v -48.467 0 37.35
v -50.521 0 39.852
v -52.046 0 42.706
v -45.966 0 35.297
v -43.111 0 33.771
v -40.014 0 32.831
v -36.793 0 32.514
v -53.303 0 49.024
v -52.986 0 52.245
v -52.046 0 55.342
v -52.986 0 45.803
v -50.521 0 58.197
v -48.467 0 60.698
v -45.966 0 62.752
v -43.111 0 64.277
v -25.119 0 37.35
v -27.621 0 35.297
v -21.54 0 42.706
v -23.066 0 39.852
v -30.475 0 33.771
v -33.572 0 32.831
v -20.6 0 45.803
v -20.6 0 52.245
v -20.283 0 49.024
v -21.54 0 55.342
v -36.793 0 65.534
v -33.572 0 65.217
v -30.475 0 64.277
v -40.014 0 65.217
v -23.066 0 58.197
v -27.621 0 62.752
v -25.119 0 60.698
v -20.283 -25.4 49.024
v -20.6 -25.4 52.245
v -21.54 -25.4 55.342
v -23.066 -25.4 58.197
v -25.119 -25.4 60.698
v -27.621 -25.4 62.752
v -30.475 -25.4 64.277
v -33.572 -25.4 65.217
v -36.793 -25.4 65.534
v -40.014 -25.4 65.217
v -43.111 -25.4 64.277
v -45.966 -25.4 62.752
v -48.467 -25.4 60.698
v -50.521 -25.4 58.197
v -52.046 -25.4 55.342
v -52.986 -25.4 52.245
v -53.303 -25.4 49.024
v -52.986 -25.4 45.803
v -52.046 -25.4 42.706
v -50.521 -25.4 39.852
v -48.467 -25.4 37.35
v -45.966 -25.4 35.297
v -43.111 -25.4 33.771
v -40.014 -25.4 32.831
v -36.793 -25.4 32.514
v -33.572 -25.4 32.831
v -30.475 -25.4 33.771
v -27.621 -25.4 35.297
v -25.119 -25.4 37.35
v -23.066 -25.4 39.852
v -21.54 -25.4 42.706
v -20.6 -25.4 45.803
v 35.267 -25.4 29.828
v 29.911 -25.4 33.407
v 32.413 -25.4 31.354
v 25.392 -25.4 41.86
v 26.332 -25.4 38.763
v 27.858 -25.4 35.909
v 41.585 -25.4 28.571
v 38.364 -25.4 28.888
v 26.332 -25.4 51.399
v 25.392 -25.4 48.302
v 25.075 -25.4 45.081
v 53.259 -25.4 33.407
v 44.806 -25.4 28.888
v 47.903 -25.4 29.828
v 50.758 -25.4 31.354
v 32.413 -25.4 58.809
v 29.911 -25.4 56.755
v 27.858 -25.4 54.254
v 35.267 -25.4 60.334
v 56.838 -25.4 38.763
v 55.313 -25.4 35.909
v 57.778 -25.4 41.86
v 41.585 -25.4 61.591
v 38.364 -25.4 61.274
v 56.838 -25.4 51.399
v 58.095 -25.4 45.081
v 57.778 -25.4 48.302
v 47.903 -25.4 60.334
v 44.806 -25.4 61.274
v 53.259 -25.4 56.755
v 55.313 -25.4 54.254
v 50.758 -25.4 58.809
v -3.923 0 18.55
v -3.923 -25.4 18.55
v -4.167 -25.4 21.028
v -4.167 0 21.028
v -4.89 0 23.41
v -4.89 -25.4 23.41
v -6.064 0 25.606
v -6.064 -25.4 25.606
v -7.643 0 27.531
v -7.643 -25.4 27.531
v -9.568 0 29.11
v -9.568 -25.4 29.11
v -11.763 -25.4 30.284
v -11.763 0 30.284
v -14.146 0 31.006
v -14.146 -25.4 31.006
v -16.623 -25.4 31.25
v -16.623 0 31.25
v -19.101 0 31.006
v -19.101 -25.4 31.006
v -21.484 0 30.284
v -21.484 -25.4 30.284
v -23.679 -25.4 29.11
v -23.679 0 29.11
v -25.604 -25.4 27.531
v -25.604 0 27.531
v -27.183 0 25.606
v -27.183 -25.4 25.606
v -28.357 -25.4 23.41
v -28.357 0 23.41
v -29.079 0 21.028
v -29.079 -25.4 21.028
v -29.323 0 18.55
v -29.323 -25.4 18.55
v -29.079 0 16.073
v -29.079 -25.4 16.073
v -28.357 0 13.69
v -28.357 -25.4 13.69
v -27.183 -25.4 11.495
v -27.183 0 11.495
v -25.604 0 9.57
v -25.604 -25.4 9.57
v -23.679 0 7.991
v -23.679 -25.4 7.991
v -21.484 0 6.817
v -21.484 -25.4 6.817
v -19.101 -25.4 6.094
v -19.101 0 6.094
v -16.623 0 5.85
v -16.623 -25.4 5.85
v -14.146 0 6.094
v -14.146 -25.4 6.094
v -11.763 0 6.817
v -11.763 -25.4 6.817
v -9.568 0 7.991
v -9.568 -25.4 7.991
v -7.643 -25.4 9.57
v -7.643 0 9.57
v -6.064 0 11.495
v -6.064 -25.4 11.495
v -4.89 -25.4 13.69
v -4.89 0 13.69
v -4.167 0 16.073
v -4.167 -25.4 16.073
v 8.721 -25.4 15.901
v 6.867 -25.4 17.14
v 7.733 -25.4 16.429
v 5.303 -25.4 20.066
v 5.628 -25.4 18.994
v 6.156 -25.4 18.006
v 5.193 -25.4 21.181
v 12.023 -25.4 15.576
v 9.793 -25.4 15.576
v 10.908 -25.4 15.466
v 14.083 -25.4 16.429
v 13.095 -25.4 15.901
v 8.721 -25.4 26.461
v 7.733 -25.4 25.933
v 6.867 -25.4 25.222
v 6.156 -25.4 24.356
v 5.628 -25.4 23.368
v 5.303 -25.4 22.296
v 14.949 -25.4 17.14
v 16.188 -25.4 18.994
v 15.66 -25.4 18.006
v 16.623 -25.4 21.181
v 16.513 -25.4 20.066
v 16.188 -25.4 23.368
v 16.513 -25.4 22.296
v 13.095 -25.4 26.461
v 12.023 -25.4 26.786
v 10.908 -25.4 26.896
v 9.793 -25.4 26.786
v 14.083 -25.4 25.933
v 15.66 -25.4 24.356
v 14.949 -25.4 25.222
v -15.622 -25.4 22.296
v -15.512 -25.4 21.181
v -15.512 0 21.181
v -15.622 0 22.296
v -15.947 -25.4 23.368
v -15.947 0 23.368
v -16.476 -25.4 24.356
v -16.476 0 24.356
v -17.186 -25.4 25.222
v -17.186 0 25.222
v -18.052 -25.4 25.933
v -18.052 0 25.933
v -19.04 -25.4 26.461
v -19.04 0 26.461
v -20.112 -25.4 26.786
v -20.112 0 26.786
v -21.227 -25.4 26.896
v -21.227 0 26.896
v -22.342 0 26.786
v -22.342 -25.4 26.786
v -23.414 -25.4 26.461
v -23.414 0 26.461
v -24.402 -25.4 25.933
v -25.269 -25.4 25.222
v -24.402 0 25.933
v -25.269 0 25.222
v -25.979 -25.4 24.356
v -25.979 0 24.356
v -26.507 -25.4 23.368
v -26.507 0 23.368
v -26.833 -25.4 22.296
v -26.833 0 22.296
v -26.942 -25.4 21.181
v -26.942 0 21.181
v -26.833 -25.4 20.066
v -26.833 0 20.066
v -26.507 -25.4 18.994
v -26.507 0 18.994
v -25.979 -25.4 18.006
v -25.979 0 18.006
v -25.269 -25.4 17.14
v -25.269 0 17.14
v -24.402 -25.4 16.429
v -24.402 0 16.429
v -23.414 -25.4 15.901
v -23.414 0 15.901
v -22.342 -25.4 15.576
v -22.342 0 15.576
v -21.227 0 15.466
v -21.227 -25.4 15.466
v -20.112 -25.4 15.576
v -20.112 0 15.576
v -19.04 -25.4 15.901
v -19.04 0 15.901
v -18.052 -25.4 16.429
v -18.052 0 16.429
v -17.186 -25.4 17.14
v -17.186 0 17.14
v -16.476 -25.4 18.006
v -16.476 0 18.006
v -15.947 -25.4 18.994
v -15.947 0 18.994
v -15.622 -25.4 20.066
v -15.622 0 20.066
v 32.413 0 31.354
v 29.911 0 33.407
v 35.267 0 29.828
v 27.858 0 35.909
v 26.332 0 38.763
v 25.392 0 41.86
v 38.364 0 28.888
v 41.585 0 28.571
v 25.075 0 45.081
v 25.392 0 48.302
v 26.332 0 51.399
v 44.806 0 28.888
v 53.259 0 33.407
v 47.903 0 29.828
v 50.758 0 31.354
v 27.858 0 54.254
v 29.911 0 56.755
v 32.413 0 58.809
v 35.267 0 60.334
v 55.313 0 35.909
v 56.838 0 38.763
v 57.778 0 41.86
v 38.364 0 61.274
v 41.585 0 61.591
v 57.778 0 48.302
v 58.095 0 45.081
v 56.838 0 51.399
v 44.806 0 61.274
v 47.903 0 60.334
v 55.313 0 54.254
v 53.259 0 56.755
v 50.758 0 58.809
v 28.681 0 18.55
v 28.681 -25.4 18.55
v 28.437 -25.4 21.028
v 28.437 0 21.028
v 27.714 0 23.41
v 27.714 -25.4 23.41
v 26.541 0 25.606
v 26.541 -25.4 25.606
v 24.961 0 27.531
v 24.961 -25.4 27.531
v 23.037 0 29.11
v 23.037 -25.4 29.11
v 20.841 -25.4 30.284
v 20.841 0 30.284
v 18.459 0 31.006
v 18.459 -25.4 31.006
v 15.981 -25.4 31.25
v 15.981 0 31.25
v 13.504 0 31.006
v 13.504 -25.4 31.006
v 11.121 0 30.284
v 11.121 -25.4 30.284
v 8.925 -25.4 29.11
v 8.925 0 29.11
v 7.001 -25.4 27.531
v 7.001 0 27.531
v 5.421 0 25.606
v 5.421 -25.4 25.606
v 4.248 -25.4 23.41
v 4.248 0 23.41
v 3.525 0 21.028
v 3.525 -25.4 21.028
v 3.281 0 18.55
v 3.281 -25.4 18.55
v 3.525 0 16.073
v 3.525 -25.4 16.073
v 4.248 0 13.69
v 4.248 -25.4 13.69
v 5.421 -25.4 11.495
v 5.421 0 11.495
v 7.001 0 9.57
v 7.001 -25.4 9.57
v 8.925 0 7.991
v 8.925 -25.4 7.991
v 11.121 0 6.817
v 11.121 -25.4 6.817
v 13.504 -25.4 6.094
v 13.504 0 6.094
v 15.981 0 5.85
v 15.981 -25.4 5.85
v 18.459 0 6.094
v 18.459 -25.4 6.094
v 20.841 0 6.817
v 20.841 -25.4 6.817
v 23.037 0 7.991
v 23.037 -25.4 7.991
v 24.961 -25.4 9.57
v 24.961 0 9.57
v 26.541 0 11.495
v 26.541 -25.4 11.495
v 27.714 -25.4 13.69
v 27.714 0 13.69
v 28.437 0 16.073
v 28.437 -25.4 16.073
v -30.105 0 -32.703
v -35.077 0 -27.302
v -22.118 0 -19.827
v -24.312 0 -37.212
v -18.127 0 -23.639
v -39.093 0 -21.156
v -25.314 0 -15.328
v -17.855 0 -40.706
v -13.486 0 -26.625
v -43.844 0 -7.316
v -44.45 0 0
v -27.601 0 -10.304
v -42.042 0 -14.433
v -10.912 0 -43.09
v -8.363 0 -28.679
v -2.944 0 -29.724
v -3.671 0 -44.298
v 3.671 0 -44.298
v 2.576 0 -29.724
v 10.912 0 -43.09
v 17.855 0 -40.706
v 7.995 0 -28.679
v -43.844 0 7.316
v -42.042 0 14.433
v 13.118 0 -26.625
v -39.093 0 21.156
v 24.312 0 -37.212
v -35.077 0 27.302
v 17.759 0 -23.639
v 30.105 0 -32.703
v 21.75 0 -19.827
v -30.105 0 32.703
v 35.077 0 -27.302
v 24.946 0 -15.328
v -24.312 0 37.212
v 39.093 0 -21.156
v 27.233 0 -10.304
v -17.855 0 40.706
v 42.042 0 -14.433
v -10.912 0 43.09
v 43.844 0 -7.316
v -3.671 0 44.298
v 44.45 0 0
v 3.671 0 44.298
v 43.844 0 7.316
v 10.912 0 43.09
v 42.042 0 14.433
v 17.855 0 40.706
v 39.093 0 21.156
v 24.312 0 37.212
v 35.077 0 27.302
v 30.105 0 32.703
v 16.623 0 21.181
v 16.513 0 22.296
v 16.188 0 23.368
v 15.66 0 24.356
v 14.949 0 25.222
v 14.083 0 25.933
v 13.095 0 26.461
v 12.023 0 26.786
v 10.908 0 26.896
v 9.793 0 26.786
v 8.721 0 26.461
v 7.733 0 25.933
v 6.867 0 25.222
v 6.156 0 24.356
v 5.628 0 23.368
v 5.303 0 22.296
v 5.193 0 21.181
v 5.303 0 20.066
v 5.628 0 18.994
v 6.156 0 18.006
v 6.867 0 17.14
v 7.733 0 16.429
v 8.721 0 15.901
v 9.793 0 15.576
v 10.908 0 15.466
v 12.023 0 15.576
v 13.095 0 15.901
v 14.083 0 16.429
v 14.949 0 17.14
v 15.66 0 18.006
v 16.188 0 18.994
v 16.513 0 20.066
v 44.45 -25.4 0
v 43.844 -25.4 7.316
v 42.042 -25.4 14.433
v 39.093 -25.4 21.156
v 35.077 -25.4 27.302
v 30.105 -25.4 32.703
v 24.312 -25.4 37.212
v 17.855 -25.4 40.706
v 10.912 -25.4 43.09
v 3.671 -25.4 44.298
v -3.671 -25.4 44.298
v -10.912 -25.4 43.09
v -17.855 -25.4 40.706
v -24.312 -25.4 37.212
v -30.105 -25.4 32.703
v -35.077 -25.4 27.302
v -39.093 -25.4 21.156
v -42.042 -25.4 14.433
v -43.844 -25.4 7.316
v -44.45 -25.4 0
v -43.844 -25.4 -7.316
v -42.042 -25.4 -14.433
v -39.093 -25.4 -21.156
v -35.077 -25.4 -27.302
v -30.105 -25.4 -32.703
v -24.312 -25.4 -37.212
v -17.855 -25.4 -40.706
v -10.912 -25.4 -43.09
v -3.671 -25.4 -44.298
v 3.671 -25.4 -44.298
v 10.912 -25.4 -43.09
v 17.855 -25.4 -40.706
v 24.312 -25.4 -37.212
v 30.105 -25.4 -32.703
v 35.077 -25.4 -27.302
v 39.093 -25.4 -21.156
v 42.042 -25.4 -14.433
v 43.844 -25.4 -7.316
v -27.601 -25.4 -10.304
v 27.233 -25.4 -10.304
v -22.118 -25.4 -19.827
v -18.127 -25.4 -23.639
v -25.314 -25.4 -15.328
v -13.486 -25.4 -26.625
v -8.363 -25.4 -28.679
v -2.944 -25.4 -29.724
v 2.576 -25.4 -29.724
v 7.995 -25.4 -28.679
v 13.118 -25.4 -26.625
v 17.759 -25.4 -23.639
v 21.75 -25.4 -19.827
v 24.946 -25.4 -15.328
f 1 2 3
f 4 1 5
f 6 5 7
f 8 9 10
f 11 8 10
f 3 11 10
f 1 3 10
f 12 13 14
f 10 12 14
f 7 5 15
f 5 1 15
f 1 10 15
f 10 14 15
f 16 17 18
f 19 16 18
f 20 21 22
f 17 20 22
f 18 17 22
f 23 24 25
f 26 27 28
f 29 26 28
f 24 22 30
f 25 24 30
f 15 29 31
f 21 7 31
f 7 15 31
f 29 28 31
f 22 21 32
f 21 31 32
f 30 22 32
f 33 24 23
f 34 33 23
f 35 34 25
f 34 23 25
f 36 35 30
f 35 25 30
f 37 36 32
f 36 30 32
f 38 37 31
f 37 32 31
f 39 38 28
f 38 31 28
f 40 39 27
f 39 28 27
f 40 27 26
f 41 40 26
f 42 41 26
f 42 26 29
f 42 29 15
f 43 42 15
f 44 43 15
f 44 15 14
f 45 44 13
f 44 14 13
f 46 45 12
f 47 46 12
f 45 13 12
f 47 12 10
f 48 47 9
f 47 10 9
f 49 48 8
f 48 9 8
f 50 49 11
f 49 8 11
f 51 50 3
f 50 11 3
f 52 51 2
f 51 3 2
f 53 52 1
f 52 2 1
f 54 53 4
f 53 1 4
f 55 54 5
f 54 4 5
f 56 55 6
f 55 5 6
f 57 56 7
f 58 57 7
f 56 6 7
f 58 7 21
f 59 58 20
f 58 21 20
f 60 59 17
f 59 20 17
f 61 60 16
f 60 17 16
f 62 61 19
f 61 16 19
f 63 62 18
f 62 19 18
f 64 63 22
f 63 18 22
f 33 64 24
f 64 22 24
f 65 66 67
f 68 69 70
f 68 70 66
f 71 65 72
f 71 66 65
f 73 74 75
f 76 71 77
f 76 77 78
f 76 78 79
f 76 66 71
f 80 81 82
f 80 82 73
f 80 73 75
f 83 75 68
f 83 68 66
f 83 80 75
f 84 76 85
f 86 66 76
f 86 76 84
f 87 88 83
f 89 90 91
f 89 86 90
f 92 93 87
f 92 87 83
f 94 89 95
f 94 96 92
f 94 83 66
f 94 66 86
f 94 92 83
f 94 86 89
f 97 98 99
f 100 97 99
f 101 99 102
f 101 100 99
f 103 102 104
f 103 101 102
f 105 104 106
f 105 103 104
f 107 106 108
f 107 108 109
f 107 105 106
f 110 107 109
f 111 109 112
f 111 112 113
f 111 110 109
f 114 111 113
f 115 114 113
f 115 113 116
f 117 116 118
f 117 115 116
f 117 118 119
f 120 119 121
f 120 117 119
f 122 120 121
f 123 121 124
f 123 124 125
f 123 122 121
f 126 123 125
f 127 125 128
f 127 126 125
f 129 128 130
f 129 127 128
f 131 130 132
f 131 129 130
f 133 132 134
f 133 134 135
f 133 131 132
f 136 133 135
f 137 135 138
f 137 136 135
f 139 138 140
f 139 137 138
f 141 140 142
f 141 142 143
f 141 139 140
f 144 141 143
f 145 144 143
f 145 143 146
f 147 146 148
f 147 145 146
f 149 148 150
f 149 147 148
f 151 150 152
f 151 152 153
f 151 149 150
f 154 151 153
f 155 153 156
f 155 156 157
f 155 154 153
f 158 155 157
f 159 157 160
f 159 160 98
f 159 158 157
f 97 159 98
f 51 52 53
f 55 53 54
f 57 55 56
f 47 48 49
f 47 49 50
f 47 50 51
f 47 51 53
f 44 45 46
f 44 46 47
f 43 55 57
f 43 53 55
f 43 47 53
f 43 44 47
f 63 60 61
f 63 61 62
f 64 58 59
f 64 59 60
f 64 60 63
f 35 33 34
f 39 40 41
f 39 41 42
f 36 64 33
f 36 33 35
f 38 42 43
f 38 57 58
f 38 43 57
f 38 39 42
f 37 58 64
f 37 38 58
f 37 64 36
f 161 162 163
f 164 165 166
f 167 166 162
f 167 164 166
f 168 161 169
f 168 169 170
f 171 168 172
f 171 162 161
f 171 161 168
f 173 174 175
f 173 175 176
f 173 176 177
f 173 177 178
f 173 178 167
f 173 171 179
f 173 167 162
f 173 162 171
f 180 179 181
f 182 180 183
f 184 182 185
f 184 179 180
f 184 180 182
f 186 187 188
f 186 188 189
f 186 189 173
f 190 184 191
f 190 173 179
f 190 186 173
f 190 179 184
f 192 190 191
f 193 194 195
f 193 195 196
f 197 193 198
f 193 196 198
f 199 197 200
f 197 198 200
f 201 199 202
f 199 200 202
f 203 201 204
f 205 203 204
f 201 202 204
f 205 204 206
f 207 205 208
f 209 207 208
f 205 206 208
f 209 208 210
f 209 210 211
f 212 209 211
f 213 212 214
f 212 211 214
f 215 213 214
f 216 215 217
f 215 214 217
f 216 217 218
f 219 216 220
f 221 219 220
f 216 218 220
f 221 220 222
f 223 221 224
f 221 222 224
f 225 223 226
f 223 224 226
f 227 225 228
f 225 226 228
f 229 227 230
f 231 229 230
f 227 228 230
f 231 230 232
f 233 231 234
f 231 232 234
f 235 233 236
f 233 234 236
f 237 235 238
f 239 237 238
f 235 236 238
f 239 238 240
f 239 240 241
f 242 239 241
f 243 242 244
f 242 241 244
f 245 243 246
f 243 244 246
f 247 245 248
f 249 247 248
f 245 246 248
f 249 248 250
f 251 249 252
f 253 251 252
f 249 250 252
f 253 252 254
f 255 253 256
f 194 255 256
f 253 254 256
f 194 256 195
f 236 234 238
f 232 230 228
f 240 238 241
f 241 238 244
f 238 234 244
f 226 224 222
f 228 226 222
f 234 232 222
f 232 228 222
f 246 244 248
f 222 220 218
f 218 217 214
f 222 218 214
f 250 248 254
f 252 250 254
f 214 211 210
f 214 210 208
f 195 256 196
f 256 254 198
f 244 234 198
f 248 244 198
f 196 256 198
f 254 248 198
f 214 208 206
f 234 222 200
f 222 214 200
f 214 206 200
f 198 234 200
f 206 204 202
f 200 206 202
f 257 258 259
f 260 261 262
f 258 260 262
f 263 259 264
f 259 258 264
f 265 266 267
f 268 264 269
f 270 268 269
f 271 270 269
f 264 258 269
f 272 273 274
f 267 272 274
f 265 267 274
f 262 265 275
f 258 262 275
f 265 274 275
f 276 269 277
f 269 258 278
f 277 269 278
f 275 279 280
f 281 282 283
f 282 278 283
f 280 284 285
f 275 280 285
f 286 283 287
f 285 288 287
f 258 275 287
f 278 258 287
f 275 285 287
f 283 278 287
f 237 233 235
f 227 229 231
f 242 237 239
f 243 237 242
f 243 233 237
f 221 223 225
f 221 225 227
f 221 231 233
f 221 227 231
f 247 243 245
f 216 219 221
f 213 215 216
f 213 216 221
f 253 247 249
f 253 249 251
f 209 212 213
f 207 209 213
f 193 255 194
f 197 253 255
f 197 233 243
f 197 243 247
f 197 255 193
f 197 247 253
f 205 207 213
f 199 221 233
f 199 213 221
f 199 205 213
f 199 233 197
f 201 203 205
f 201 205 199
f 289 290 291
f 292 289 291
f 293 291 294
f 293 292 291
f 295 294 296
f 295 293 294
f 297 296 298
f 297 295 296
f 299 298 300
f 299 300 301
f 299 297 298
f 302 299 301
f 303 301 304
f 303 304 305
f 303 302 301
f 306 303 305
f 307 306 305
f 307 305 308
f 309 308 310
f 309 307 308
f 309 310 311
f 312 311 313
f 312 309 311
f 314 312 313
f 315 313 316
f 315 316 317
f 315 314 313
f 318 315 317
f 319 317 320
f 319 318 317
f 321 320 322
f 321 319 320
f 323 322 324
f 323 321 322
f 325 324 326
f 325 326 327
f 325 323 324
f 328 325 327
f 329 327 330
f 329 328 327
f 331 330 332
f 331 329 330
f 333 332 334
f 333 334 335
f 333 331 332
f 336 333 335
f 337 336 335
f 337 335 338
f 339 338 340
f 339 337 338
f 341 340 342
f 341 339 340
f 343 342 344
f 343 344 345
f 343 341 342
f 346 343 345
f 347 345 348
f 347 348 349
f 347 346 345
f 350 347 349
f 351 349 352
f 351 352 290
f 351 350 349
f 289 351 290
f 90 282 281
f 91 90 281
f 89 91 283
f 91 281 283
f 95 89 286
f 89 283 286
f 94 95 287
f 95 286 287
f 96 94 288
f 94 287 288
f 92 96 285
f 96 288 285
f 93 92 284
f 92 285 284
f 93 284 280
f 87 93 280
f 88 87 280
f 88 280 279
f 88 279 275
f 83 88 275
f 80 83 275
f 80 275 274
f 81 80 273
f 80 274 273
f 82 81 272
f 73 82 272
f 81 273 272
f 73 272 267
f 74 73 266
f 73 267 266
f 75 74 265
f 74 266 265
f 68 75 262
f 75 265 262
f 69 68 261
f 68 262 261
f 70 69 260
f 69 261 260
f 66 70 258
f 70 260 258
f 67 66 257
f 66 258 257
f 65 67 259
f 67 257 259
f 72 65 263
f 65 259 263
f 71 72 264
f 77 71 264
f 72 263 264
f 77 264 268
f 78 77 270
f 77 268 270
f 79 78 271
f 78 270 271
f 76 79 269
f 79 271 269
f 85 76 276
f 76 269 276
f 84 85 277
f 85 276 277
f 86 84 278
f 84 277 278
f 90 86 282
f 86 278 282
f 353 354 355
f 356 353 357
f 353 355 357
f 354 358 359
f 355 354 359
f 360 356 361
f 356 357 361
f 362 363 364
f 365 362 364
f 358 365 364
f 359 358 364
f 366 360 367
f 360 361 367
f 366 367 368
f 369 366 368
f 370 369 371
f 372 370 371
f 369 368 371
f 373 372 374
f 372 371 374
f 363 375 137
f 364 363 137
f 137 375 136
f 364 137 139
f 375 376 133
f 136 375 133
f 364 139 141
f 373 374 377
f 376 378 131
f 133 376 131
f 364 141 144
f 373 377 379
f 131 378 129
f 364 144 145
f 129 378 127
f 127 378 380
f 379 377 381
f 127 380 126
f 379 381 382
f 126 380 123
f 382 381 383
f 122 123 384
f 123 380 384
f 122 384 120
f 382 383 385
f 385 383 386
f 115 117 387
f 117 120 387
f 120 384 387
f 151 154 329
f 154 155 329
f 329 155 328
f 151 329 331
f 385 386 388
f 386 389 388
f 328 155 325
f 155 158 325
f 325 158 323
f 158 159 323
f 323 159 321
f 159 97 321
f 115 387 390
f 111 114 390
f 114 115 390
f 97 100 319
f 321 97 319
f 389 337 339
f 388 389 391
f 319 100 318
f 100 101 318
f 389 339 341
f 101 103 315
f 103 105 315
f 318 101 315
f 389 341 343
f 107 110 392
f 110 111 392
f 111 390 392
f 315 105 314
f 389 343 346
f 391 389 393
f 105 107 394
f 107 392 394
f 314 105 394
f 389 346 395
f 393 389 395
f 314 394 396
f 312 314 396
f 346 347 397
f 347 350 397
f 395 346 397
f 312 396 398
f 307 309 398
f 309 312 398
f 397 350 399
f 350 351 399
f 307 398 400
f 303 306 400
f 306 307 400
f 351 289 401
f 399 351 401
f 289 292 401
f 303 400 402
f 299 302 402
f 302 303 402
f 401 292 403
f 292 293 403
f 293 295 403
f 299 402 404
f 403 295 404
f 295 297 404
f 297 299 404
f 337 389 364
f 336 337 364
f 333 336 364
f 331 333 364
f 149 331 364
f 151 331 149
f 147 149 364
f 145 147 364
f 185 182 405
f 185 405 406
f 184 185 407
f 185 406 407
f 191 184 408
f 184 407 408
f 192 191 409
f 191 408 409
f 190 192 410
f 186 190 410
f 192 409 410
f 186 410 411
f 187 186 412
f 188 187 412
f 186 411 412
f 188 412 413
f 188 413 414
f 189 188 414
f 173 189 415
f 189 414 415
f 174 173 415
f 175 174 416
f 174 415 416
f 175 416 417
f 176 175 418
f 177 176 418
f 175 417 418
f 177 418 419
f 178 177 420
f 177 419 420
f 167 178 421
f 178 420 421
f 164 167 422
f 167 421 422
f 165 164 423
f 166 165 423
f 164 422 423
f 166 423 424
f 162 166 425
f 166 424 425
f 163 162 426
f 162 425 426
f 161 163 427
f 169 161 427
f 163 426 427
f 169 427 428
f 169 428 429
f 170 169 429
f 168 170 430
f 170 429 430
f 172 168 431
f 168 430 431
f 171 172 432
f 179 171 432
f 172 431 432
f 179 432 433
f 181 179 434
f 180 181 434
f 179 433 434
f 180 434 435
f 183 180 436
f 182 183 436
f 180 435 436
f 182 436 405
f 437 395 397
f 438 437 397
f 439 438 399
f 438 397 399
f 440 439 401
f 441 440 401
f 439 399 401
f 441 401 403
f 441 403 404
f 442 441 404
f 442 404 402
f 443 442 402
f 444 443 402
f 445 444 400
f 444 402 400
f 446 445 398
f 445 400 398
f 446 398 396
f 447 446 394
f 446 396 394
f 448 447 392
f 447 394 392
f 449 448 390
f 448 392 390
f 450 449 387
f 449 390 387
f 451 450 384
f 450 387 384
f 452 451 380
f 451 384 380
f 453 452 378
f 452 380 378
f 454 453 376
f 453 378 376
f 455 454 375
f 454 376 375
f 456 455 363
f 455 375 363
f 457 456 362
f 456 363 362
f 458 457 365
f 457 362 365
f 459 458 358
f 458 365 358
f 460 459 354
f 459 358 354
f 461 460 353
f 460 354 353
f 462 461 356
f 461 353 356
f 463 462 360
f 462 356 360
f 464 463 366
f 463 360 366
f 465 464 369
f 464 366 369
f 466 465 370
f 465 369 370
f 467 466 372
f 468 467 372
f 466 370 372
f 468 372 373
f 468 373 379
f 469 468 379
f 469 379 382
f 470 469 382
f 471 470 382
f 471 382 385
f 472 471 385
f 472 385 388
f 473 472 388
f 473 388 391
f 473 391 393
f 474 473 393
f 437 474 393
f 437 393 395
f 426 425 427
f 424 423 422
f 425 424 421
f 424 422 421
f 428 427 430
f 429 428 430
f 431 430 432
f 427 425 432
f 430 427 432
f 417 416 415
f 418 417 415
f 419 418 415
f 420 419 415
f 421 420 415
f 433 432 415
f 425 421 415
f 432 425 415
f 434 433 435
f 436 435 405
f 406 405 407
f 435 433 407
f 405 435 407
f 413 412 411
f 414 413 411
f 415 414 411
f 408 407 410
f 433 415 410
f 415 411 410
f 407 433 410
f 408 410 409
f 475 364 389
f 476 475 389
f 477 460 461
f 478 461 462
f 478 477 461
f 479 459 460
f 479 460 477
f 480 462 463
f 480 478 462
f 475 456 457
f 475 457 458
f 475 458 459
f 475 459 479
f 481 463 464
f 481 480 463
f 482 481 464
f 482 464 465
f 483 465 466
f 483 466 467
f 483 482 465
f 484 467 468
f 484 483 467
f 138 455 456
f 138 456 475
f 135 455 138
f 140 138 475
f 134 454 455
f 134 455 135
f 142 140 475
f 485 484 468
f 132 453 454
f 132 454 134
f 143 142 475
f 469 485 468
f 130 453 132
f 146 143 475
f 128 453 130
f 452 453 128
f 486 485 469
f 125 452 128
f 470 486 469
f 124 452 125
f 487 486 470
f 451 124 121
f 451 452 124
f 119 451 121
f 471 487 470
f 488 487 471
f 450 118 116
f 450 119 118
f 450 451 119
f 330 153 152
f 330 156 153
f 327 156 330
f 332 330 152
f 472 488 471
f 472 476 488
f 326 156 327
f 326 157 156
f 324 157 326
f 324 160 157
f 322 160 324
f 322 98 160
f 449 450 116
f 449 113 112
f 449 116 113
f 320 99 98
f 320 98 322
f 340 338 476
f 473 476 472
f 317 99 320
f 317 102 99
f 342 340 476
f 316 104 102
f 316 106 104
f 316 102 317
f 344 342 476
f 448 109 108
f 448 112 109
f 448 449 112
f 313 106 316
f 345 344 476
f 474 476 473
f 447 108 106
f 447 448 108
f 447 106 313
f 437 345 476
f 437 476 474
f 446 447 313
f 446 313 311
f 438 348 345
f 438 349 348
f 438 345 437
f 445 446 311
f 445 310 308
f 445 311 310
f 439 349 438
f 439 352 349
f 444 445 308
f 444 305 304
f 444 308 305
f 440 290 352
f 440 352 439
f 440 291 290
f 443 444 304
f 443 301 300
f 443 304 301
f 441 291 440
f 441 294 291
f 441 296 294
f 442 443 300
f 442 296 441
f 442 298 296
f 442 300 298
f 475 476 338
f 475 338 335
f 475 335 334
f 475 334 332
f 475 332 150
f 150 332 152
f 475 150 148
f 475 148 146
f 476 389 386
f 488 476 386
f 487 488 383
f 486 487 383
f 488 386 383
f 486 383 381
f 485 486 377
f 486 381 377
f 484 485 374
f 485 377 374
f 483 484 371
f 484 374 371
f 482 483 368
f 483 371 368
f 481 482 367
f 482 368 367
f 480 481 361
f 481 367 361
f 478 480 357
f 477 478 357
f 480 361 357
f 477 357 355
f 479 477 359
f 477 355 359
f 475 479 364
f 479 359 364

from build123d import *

# Parameters (mm, degrees)
F0_R     = 16.51
F0_R_2   = 44.45
F0_R_3   = 12.7
F0_R_4   = 5.715
F1_DEPTH = 25.4


with BuildPart() as f1:
    # F0 (on Front) → F1 (new body)
    with BuildSketch(Plane.XZ):
        with Locations((41.585071, 45.081161)):
            Circle(F0_R)
        with Locations((-36.793161, 49.024165)):
            Circle(F0_R)
        Circle(F0_R_2)
        with BuildLine():
            ThreePointArc((27.232699, -10.304265), (-0.184006, -29.856091), (-27.600711, -10.304265))
            Line((-27.600711, -10.304265), (27.232699, -10.304265))
        make_face(mode=Mode.SUBTRACT)
        with Locations((-16.623441, 18.550344)):
            Circle(F0_R_3, mode=Mode.SUBTRACT)
        with Locations((15.981161, 18.550344)):
            Circle(F0_R_3, mode=Mode.SUBTRACT)
        with Locations((-21.227399, 21.181179)):
            Circle(F0_R_4)
        with Locations((10.907708, 21.181179)):
            Circle(F0_R_4)
    extrude(amount=F1_DEPTH)


solid = f1.part
